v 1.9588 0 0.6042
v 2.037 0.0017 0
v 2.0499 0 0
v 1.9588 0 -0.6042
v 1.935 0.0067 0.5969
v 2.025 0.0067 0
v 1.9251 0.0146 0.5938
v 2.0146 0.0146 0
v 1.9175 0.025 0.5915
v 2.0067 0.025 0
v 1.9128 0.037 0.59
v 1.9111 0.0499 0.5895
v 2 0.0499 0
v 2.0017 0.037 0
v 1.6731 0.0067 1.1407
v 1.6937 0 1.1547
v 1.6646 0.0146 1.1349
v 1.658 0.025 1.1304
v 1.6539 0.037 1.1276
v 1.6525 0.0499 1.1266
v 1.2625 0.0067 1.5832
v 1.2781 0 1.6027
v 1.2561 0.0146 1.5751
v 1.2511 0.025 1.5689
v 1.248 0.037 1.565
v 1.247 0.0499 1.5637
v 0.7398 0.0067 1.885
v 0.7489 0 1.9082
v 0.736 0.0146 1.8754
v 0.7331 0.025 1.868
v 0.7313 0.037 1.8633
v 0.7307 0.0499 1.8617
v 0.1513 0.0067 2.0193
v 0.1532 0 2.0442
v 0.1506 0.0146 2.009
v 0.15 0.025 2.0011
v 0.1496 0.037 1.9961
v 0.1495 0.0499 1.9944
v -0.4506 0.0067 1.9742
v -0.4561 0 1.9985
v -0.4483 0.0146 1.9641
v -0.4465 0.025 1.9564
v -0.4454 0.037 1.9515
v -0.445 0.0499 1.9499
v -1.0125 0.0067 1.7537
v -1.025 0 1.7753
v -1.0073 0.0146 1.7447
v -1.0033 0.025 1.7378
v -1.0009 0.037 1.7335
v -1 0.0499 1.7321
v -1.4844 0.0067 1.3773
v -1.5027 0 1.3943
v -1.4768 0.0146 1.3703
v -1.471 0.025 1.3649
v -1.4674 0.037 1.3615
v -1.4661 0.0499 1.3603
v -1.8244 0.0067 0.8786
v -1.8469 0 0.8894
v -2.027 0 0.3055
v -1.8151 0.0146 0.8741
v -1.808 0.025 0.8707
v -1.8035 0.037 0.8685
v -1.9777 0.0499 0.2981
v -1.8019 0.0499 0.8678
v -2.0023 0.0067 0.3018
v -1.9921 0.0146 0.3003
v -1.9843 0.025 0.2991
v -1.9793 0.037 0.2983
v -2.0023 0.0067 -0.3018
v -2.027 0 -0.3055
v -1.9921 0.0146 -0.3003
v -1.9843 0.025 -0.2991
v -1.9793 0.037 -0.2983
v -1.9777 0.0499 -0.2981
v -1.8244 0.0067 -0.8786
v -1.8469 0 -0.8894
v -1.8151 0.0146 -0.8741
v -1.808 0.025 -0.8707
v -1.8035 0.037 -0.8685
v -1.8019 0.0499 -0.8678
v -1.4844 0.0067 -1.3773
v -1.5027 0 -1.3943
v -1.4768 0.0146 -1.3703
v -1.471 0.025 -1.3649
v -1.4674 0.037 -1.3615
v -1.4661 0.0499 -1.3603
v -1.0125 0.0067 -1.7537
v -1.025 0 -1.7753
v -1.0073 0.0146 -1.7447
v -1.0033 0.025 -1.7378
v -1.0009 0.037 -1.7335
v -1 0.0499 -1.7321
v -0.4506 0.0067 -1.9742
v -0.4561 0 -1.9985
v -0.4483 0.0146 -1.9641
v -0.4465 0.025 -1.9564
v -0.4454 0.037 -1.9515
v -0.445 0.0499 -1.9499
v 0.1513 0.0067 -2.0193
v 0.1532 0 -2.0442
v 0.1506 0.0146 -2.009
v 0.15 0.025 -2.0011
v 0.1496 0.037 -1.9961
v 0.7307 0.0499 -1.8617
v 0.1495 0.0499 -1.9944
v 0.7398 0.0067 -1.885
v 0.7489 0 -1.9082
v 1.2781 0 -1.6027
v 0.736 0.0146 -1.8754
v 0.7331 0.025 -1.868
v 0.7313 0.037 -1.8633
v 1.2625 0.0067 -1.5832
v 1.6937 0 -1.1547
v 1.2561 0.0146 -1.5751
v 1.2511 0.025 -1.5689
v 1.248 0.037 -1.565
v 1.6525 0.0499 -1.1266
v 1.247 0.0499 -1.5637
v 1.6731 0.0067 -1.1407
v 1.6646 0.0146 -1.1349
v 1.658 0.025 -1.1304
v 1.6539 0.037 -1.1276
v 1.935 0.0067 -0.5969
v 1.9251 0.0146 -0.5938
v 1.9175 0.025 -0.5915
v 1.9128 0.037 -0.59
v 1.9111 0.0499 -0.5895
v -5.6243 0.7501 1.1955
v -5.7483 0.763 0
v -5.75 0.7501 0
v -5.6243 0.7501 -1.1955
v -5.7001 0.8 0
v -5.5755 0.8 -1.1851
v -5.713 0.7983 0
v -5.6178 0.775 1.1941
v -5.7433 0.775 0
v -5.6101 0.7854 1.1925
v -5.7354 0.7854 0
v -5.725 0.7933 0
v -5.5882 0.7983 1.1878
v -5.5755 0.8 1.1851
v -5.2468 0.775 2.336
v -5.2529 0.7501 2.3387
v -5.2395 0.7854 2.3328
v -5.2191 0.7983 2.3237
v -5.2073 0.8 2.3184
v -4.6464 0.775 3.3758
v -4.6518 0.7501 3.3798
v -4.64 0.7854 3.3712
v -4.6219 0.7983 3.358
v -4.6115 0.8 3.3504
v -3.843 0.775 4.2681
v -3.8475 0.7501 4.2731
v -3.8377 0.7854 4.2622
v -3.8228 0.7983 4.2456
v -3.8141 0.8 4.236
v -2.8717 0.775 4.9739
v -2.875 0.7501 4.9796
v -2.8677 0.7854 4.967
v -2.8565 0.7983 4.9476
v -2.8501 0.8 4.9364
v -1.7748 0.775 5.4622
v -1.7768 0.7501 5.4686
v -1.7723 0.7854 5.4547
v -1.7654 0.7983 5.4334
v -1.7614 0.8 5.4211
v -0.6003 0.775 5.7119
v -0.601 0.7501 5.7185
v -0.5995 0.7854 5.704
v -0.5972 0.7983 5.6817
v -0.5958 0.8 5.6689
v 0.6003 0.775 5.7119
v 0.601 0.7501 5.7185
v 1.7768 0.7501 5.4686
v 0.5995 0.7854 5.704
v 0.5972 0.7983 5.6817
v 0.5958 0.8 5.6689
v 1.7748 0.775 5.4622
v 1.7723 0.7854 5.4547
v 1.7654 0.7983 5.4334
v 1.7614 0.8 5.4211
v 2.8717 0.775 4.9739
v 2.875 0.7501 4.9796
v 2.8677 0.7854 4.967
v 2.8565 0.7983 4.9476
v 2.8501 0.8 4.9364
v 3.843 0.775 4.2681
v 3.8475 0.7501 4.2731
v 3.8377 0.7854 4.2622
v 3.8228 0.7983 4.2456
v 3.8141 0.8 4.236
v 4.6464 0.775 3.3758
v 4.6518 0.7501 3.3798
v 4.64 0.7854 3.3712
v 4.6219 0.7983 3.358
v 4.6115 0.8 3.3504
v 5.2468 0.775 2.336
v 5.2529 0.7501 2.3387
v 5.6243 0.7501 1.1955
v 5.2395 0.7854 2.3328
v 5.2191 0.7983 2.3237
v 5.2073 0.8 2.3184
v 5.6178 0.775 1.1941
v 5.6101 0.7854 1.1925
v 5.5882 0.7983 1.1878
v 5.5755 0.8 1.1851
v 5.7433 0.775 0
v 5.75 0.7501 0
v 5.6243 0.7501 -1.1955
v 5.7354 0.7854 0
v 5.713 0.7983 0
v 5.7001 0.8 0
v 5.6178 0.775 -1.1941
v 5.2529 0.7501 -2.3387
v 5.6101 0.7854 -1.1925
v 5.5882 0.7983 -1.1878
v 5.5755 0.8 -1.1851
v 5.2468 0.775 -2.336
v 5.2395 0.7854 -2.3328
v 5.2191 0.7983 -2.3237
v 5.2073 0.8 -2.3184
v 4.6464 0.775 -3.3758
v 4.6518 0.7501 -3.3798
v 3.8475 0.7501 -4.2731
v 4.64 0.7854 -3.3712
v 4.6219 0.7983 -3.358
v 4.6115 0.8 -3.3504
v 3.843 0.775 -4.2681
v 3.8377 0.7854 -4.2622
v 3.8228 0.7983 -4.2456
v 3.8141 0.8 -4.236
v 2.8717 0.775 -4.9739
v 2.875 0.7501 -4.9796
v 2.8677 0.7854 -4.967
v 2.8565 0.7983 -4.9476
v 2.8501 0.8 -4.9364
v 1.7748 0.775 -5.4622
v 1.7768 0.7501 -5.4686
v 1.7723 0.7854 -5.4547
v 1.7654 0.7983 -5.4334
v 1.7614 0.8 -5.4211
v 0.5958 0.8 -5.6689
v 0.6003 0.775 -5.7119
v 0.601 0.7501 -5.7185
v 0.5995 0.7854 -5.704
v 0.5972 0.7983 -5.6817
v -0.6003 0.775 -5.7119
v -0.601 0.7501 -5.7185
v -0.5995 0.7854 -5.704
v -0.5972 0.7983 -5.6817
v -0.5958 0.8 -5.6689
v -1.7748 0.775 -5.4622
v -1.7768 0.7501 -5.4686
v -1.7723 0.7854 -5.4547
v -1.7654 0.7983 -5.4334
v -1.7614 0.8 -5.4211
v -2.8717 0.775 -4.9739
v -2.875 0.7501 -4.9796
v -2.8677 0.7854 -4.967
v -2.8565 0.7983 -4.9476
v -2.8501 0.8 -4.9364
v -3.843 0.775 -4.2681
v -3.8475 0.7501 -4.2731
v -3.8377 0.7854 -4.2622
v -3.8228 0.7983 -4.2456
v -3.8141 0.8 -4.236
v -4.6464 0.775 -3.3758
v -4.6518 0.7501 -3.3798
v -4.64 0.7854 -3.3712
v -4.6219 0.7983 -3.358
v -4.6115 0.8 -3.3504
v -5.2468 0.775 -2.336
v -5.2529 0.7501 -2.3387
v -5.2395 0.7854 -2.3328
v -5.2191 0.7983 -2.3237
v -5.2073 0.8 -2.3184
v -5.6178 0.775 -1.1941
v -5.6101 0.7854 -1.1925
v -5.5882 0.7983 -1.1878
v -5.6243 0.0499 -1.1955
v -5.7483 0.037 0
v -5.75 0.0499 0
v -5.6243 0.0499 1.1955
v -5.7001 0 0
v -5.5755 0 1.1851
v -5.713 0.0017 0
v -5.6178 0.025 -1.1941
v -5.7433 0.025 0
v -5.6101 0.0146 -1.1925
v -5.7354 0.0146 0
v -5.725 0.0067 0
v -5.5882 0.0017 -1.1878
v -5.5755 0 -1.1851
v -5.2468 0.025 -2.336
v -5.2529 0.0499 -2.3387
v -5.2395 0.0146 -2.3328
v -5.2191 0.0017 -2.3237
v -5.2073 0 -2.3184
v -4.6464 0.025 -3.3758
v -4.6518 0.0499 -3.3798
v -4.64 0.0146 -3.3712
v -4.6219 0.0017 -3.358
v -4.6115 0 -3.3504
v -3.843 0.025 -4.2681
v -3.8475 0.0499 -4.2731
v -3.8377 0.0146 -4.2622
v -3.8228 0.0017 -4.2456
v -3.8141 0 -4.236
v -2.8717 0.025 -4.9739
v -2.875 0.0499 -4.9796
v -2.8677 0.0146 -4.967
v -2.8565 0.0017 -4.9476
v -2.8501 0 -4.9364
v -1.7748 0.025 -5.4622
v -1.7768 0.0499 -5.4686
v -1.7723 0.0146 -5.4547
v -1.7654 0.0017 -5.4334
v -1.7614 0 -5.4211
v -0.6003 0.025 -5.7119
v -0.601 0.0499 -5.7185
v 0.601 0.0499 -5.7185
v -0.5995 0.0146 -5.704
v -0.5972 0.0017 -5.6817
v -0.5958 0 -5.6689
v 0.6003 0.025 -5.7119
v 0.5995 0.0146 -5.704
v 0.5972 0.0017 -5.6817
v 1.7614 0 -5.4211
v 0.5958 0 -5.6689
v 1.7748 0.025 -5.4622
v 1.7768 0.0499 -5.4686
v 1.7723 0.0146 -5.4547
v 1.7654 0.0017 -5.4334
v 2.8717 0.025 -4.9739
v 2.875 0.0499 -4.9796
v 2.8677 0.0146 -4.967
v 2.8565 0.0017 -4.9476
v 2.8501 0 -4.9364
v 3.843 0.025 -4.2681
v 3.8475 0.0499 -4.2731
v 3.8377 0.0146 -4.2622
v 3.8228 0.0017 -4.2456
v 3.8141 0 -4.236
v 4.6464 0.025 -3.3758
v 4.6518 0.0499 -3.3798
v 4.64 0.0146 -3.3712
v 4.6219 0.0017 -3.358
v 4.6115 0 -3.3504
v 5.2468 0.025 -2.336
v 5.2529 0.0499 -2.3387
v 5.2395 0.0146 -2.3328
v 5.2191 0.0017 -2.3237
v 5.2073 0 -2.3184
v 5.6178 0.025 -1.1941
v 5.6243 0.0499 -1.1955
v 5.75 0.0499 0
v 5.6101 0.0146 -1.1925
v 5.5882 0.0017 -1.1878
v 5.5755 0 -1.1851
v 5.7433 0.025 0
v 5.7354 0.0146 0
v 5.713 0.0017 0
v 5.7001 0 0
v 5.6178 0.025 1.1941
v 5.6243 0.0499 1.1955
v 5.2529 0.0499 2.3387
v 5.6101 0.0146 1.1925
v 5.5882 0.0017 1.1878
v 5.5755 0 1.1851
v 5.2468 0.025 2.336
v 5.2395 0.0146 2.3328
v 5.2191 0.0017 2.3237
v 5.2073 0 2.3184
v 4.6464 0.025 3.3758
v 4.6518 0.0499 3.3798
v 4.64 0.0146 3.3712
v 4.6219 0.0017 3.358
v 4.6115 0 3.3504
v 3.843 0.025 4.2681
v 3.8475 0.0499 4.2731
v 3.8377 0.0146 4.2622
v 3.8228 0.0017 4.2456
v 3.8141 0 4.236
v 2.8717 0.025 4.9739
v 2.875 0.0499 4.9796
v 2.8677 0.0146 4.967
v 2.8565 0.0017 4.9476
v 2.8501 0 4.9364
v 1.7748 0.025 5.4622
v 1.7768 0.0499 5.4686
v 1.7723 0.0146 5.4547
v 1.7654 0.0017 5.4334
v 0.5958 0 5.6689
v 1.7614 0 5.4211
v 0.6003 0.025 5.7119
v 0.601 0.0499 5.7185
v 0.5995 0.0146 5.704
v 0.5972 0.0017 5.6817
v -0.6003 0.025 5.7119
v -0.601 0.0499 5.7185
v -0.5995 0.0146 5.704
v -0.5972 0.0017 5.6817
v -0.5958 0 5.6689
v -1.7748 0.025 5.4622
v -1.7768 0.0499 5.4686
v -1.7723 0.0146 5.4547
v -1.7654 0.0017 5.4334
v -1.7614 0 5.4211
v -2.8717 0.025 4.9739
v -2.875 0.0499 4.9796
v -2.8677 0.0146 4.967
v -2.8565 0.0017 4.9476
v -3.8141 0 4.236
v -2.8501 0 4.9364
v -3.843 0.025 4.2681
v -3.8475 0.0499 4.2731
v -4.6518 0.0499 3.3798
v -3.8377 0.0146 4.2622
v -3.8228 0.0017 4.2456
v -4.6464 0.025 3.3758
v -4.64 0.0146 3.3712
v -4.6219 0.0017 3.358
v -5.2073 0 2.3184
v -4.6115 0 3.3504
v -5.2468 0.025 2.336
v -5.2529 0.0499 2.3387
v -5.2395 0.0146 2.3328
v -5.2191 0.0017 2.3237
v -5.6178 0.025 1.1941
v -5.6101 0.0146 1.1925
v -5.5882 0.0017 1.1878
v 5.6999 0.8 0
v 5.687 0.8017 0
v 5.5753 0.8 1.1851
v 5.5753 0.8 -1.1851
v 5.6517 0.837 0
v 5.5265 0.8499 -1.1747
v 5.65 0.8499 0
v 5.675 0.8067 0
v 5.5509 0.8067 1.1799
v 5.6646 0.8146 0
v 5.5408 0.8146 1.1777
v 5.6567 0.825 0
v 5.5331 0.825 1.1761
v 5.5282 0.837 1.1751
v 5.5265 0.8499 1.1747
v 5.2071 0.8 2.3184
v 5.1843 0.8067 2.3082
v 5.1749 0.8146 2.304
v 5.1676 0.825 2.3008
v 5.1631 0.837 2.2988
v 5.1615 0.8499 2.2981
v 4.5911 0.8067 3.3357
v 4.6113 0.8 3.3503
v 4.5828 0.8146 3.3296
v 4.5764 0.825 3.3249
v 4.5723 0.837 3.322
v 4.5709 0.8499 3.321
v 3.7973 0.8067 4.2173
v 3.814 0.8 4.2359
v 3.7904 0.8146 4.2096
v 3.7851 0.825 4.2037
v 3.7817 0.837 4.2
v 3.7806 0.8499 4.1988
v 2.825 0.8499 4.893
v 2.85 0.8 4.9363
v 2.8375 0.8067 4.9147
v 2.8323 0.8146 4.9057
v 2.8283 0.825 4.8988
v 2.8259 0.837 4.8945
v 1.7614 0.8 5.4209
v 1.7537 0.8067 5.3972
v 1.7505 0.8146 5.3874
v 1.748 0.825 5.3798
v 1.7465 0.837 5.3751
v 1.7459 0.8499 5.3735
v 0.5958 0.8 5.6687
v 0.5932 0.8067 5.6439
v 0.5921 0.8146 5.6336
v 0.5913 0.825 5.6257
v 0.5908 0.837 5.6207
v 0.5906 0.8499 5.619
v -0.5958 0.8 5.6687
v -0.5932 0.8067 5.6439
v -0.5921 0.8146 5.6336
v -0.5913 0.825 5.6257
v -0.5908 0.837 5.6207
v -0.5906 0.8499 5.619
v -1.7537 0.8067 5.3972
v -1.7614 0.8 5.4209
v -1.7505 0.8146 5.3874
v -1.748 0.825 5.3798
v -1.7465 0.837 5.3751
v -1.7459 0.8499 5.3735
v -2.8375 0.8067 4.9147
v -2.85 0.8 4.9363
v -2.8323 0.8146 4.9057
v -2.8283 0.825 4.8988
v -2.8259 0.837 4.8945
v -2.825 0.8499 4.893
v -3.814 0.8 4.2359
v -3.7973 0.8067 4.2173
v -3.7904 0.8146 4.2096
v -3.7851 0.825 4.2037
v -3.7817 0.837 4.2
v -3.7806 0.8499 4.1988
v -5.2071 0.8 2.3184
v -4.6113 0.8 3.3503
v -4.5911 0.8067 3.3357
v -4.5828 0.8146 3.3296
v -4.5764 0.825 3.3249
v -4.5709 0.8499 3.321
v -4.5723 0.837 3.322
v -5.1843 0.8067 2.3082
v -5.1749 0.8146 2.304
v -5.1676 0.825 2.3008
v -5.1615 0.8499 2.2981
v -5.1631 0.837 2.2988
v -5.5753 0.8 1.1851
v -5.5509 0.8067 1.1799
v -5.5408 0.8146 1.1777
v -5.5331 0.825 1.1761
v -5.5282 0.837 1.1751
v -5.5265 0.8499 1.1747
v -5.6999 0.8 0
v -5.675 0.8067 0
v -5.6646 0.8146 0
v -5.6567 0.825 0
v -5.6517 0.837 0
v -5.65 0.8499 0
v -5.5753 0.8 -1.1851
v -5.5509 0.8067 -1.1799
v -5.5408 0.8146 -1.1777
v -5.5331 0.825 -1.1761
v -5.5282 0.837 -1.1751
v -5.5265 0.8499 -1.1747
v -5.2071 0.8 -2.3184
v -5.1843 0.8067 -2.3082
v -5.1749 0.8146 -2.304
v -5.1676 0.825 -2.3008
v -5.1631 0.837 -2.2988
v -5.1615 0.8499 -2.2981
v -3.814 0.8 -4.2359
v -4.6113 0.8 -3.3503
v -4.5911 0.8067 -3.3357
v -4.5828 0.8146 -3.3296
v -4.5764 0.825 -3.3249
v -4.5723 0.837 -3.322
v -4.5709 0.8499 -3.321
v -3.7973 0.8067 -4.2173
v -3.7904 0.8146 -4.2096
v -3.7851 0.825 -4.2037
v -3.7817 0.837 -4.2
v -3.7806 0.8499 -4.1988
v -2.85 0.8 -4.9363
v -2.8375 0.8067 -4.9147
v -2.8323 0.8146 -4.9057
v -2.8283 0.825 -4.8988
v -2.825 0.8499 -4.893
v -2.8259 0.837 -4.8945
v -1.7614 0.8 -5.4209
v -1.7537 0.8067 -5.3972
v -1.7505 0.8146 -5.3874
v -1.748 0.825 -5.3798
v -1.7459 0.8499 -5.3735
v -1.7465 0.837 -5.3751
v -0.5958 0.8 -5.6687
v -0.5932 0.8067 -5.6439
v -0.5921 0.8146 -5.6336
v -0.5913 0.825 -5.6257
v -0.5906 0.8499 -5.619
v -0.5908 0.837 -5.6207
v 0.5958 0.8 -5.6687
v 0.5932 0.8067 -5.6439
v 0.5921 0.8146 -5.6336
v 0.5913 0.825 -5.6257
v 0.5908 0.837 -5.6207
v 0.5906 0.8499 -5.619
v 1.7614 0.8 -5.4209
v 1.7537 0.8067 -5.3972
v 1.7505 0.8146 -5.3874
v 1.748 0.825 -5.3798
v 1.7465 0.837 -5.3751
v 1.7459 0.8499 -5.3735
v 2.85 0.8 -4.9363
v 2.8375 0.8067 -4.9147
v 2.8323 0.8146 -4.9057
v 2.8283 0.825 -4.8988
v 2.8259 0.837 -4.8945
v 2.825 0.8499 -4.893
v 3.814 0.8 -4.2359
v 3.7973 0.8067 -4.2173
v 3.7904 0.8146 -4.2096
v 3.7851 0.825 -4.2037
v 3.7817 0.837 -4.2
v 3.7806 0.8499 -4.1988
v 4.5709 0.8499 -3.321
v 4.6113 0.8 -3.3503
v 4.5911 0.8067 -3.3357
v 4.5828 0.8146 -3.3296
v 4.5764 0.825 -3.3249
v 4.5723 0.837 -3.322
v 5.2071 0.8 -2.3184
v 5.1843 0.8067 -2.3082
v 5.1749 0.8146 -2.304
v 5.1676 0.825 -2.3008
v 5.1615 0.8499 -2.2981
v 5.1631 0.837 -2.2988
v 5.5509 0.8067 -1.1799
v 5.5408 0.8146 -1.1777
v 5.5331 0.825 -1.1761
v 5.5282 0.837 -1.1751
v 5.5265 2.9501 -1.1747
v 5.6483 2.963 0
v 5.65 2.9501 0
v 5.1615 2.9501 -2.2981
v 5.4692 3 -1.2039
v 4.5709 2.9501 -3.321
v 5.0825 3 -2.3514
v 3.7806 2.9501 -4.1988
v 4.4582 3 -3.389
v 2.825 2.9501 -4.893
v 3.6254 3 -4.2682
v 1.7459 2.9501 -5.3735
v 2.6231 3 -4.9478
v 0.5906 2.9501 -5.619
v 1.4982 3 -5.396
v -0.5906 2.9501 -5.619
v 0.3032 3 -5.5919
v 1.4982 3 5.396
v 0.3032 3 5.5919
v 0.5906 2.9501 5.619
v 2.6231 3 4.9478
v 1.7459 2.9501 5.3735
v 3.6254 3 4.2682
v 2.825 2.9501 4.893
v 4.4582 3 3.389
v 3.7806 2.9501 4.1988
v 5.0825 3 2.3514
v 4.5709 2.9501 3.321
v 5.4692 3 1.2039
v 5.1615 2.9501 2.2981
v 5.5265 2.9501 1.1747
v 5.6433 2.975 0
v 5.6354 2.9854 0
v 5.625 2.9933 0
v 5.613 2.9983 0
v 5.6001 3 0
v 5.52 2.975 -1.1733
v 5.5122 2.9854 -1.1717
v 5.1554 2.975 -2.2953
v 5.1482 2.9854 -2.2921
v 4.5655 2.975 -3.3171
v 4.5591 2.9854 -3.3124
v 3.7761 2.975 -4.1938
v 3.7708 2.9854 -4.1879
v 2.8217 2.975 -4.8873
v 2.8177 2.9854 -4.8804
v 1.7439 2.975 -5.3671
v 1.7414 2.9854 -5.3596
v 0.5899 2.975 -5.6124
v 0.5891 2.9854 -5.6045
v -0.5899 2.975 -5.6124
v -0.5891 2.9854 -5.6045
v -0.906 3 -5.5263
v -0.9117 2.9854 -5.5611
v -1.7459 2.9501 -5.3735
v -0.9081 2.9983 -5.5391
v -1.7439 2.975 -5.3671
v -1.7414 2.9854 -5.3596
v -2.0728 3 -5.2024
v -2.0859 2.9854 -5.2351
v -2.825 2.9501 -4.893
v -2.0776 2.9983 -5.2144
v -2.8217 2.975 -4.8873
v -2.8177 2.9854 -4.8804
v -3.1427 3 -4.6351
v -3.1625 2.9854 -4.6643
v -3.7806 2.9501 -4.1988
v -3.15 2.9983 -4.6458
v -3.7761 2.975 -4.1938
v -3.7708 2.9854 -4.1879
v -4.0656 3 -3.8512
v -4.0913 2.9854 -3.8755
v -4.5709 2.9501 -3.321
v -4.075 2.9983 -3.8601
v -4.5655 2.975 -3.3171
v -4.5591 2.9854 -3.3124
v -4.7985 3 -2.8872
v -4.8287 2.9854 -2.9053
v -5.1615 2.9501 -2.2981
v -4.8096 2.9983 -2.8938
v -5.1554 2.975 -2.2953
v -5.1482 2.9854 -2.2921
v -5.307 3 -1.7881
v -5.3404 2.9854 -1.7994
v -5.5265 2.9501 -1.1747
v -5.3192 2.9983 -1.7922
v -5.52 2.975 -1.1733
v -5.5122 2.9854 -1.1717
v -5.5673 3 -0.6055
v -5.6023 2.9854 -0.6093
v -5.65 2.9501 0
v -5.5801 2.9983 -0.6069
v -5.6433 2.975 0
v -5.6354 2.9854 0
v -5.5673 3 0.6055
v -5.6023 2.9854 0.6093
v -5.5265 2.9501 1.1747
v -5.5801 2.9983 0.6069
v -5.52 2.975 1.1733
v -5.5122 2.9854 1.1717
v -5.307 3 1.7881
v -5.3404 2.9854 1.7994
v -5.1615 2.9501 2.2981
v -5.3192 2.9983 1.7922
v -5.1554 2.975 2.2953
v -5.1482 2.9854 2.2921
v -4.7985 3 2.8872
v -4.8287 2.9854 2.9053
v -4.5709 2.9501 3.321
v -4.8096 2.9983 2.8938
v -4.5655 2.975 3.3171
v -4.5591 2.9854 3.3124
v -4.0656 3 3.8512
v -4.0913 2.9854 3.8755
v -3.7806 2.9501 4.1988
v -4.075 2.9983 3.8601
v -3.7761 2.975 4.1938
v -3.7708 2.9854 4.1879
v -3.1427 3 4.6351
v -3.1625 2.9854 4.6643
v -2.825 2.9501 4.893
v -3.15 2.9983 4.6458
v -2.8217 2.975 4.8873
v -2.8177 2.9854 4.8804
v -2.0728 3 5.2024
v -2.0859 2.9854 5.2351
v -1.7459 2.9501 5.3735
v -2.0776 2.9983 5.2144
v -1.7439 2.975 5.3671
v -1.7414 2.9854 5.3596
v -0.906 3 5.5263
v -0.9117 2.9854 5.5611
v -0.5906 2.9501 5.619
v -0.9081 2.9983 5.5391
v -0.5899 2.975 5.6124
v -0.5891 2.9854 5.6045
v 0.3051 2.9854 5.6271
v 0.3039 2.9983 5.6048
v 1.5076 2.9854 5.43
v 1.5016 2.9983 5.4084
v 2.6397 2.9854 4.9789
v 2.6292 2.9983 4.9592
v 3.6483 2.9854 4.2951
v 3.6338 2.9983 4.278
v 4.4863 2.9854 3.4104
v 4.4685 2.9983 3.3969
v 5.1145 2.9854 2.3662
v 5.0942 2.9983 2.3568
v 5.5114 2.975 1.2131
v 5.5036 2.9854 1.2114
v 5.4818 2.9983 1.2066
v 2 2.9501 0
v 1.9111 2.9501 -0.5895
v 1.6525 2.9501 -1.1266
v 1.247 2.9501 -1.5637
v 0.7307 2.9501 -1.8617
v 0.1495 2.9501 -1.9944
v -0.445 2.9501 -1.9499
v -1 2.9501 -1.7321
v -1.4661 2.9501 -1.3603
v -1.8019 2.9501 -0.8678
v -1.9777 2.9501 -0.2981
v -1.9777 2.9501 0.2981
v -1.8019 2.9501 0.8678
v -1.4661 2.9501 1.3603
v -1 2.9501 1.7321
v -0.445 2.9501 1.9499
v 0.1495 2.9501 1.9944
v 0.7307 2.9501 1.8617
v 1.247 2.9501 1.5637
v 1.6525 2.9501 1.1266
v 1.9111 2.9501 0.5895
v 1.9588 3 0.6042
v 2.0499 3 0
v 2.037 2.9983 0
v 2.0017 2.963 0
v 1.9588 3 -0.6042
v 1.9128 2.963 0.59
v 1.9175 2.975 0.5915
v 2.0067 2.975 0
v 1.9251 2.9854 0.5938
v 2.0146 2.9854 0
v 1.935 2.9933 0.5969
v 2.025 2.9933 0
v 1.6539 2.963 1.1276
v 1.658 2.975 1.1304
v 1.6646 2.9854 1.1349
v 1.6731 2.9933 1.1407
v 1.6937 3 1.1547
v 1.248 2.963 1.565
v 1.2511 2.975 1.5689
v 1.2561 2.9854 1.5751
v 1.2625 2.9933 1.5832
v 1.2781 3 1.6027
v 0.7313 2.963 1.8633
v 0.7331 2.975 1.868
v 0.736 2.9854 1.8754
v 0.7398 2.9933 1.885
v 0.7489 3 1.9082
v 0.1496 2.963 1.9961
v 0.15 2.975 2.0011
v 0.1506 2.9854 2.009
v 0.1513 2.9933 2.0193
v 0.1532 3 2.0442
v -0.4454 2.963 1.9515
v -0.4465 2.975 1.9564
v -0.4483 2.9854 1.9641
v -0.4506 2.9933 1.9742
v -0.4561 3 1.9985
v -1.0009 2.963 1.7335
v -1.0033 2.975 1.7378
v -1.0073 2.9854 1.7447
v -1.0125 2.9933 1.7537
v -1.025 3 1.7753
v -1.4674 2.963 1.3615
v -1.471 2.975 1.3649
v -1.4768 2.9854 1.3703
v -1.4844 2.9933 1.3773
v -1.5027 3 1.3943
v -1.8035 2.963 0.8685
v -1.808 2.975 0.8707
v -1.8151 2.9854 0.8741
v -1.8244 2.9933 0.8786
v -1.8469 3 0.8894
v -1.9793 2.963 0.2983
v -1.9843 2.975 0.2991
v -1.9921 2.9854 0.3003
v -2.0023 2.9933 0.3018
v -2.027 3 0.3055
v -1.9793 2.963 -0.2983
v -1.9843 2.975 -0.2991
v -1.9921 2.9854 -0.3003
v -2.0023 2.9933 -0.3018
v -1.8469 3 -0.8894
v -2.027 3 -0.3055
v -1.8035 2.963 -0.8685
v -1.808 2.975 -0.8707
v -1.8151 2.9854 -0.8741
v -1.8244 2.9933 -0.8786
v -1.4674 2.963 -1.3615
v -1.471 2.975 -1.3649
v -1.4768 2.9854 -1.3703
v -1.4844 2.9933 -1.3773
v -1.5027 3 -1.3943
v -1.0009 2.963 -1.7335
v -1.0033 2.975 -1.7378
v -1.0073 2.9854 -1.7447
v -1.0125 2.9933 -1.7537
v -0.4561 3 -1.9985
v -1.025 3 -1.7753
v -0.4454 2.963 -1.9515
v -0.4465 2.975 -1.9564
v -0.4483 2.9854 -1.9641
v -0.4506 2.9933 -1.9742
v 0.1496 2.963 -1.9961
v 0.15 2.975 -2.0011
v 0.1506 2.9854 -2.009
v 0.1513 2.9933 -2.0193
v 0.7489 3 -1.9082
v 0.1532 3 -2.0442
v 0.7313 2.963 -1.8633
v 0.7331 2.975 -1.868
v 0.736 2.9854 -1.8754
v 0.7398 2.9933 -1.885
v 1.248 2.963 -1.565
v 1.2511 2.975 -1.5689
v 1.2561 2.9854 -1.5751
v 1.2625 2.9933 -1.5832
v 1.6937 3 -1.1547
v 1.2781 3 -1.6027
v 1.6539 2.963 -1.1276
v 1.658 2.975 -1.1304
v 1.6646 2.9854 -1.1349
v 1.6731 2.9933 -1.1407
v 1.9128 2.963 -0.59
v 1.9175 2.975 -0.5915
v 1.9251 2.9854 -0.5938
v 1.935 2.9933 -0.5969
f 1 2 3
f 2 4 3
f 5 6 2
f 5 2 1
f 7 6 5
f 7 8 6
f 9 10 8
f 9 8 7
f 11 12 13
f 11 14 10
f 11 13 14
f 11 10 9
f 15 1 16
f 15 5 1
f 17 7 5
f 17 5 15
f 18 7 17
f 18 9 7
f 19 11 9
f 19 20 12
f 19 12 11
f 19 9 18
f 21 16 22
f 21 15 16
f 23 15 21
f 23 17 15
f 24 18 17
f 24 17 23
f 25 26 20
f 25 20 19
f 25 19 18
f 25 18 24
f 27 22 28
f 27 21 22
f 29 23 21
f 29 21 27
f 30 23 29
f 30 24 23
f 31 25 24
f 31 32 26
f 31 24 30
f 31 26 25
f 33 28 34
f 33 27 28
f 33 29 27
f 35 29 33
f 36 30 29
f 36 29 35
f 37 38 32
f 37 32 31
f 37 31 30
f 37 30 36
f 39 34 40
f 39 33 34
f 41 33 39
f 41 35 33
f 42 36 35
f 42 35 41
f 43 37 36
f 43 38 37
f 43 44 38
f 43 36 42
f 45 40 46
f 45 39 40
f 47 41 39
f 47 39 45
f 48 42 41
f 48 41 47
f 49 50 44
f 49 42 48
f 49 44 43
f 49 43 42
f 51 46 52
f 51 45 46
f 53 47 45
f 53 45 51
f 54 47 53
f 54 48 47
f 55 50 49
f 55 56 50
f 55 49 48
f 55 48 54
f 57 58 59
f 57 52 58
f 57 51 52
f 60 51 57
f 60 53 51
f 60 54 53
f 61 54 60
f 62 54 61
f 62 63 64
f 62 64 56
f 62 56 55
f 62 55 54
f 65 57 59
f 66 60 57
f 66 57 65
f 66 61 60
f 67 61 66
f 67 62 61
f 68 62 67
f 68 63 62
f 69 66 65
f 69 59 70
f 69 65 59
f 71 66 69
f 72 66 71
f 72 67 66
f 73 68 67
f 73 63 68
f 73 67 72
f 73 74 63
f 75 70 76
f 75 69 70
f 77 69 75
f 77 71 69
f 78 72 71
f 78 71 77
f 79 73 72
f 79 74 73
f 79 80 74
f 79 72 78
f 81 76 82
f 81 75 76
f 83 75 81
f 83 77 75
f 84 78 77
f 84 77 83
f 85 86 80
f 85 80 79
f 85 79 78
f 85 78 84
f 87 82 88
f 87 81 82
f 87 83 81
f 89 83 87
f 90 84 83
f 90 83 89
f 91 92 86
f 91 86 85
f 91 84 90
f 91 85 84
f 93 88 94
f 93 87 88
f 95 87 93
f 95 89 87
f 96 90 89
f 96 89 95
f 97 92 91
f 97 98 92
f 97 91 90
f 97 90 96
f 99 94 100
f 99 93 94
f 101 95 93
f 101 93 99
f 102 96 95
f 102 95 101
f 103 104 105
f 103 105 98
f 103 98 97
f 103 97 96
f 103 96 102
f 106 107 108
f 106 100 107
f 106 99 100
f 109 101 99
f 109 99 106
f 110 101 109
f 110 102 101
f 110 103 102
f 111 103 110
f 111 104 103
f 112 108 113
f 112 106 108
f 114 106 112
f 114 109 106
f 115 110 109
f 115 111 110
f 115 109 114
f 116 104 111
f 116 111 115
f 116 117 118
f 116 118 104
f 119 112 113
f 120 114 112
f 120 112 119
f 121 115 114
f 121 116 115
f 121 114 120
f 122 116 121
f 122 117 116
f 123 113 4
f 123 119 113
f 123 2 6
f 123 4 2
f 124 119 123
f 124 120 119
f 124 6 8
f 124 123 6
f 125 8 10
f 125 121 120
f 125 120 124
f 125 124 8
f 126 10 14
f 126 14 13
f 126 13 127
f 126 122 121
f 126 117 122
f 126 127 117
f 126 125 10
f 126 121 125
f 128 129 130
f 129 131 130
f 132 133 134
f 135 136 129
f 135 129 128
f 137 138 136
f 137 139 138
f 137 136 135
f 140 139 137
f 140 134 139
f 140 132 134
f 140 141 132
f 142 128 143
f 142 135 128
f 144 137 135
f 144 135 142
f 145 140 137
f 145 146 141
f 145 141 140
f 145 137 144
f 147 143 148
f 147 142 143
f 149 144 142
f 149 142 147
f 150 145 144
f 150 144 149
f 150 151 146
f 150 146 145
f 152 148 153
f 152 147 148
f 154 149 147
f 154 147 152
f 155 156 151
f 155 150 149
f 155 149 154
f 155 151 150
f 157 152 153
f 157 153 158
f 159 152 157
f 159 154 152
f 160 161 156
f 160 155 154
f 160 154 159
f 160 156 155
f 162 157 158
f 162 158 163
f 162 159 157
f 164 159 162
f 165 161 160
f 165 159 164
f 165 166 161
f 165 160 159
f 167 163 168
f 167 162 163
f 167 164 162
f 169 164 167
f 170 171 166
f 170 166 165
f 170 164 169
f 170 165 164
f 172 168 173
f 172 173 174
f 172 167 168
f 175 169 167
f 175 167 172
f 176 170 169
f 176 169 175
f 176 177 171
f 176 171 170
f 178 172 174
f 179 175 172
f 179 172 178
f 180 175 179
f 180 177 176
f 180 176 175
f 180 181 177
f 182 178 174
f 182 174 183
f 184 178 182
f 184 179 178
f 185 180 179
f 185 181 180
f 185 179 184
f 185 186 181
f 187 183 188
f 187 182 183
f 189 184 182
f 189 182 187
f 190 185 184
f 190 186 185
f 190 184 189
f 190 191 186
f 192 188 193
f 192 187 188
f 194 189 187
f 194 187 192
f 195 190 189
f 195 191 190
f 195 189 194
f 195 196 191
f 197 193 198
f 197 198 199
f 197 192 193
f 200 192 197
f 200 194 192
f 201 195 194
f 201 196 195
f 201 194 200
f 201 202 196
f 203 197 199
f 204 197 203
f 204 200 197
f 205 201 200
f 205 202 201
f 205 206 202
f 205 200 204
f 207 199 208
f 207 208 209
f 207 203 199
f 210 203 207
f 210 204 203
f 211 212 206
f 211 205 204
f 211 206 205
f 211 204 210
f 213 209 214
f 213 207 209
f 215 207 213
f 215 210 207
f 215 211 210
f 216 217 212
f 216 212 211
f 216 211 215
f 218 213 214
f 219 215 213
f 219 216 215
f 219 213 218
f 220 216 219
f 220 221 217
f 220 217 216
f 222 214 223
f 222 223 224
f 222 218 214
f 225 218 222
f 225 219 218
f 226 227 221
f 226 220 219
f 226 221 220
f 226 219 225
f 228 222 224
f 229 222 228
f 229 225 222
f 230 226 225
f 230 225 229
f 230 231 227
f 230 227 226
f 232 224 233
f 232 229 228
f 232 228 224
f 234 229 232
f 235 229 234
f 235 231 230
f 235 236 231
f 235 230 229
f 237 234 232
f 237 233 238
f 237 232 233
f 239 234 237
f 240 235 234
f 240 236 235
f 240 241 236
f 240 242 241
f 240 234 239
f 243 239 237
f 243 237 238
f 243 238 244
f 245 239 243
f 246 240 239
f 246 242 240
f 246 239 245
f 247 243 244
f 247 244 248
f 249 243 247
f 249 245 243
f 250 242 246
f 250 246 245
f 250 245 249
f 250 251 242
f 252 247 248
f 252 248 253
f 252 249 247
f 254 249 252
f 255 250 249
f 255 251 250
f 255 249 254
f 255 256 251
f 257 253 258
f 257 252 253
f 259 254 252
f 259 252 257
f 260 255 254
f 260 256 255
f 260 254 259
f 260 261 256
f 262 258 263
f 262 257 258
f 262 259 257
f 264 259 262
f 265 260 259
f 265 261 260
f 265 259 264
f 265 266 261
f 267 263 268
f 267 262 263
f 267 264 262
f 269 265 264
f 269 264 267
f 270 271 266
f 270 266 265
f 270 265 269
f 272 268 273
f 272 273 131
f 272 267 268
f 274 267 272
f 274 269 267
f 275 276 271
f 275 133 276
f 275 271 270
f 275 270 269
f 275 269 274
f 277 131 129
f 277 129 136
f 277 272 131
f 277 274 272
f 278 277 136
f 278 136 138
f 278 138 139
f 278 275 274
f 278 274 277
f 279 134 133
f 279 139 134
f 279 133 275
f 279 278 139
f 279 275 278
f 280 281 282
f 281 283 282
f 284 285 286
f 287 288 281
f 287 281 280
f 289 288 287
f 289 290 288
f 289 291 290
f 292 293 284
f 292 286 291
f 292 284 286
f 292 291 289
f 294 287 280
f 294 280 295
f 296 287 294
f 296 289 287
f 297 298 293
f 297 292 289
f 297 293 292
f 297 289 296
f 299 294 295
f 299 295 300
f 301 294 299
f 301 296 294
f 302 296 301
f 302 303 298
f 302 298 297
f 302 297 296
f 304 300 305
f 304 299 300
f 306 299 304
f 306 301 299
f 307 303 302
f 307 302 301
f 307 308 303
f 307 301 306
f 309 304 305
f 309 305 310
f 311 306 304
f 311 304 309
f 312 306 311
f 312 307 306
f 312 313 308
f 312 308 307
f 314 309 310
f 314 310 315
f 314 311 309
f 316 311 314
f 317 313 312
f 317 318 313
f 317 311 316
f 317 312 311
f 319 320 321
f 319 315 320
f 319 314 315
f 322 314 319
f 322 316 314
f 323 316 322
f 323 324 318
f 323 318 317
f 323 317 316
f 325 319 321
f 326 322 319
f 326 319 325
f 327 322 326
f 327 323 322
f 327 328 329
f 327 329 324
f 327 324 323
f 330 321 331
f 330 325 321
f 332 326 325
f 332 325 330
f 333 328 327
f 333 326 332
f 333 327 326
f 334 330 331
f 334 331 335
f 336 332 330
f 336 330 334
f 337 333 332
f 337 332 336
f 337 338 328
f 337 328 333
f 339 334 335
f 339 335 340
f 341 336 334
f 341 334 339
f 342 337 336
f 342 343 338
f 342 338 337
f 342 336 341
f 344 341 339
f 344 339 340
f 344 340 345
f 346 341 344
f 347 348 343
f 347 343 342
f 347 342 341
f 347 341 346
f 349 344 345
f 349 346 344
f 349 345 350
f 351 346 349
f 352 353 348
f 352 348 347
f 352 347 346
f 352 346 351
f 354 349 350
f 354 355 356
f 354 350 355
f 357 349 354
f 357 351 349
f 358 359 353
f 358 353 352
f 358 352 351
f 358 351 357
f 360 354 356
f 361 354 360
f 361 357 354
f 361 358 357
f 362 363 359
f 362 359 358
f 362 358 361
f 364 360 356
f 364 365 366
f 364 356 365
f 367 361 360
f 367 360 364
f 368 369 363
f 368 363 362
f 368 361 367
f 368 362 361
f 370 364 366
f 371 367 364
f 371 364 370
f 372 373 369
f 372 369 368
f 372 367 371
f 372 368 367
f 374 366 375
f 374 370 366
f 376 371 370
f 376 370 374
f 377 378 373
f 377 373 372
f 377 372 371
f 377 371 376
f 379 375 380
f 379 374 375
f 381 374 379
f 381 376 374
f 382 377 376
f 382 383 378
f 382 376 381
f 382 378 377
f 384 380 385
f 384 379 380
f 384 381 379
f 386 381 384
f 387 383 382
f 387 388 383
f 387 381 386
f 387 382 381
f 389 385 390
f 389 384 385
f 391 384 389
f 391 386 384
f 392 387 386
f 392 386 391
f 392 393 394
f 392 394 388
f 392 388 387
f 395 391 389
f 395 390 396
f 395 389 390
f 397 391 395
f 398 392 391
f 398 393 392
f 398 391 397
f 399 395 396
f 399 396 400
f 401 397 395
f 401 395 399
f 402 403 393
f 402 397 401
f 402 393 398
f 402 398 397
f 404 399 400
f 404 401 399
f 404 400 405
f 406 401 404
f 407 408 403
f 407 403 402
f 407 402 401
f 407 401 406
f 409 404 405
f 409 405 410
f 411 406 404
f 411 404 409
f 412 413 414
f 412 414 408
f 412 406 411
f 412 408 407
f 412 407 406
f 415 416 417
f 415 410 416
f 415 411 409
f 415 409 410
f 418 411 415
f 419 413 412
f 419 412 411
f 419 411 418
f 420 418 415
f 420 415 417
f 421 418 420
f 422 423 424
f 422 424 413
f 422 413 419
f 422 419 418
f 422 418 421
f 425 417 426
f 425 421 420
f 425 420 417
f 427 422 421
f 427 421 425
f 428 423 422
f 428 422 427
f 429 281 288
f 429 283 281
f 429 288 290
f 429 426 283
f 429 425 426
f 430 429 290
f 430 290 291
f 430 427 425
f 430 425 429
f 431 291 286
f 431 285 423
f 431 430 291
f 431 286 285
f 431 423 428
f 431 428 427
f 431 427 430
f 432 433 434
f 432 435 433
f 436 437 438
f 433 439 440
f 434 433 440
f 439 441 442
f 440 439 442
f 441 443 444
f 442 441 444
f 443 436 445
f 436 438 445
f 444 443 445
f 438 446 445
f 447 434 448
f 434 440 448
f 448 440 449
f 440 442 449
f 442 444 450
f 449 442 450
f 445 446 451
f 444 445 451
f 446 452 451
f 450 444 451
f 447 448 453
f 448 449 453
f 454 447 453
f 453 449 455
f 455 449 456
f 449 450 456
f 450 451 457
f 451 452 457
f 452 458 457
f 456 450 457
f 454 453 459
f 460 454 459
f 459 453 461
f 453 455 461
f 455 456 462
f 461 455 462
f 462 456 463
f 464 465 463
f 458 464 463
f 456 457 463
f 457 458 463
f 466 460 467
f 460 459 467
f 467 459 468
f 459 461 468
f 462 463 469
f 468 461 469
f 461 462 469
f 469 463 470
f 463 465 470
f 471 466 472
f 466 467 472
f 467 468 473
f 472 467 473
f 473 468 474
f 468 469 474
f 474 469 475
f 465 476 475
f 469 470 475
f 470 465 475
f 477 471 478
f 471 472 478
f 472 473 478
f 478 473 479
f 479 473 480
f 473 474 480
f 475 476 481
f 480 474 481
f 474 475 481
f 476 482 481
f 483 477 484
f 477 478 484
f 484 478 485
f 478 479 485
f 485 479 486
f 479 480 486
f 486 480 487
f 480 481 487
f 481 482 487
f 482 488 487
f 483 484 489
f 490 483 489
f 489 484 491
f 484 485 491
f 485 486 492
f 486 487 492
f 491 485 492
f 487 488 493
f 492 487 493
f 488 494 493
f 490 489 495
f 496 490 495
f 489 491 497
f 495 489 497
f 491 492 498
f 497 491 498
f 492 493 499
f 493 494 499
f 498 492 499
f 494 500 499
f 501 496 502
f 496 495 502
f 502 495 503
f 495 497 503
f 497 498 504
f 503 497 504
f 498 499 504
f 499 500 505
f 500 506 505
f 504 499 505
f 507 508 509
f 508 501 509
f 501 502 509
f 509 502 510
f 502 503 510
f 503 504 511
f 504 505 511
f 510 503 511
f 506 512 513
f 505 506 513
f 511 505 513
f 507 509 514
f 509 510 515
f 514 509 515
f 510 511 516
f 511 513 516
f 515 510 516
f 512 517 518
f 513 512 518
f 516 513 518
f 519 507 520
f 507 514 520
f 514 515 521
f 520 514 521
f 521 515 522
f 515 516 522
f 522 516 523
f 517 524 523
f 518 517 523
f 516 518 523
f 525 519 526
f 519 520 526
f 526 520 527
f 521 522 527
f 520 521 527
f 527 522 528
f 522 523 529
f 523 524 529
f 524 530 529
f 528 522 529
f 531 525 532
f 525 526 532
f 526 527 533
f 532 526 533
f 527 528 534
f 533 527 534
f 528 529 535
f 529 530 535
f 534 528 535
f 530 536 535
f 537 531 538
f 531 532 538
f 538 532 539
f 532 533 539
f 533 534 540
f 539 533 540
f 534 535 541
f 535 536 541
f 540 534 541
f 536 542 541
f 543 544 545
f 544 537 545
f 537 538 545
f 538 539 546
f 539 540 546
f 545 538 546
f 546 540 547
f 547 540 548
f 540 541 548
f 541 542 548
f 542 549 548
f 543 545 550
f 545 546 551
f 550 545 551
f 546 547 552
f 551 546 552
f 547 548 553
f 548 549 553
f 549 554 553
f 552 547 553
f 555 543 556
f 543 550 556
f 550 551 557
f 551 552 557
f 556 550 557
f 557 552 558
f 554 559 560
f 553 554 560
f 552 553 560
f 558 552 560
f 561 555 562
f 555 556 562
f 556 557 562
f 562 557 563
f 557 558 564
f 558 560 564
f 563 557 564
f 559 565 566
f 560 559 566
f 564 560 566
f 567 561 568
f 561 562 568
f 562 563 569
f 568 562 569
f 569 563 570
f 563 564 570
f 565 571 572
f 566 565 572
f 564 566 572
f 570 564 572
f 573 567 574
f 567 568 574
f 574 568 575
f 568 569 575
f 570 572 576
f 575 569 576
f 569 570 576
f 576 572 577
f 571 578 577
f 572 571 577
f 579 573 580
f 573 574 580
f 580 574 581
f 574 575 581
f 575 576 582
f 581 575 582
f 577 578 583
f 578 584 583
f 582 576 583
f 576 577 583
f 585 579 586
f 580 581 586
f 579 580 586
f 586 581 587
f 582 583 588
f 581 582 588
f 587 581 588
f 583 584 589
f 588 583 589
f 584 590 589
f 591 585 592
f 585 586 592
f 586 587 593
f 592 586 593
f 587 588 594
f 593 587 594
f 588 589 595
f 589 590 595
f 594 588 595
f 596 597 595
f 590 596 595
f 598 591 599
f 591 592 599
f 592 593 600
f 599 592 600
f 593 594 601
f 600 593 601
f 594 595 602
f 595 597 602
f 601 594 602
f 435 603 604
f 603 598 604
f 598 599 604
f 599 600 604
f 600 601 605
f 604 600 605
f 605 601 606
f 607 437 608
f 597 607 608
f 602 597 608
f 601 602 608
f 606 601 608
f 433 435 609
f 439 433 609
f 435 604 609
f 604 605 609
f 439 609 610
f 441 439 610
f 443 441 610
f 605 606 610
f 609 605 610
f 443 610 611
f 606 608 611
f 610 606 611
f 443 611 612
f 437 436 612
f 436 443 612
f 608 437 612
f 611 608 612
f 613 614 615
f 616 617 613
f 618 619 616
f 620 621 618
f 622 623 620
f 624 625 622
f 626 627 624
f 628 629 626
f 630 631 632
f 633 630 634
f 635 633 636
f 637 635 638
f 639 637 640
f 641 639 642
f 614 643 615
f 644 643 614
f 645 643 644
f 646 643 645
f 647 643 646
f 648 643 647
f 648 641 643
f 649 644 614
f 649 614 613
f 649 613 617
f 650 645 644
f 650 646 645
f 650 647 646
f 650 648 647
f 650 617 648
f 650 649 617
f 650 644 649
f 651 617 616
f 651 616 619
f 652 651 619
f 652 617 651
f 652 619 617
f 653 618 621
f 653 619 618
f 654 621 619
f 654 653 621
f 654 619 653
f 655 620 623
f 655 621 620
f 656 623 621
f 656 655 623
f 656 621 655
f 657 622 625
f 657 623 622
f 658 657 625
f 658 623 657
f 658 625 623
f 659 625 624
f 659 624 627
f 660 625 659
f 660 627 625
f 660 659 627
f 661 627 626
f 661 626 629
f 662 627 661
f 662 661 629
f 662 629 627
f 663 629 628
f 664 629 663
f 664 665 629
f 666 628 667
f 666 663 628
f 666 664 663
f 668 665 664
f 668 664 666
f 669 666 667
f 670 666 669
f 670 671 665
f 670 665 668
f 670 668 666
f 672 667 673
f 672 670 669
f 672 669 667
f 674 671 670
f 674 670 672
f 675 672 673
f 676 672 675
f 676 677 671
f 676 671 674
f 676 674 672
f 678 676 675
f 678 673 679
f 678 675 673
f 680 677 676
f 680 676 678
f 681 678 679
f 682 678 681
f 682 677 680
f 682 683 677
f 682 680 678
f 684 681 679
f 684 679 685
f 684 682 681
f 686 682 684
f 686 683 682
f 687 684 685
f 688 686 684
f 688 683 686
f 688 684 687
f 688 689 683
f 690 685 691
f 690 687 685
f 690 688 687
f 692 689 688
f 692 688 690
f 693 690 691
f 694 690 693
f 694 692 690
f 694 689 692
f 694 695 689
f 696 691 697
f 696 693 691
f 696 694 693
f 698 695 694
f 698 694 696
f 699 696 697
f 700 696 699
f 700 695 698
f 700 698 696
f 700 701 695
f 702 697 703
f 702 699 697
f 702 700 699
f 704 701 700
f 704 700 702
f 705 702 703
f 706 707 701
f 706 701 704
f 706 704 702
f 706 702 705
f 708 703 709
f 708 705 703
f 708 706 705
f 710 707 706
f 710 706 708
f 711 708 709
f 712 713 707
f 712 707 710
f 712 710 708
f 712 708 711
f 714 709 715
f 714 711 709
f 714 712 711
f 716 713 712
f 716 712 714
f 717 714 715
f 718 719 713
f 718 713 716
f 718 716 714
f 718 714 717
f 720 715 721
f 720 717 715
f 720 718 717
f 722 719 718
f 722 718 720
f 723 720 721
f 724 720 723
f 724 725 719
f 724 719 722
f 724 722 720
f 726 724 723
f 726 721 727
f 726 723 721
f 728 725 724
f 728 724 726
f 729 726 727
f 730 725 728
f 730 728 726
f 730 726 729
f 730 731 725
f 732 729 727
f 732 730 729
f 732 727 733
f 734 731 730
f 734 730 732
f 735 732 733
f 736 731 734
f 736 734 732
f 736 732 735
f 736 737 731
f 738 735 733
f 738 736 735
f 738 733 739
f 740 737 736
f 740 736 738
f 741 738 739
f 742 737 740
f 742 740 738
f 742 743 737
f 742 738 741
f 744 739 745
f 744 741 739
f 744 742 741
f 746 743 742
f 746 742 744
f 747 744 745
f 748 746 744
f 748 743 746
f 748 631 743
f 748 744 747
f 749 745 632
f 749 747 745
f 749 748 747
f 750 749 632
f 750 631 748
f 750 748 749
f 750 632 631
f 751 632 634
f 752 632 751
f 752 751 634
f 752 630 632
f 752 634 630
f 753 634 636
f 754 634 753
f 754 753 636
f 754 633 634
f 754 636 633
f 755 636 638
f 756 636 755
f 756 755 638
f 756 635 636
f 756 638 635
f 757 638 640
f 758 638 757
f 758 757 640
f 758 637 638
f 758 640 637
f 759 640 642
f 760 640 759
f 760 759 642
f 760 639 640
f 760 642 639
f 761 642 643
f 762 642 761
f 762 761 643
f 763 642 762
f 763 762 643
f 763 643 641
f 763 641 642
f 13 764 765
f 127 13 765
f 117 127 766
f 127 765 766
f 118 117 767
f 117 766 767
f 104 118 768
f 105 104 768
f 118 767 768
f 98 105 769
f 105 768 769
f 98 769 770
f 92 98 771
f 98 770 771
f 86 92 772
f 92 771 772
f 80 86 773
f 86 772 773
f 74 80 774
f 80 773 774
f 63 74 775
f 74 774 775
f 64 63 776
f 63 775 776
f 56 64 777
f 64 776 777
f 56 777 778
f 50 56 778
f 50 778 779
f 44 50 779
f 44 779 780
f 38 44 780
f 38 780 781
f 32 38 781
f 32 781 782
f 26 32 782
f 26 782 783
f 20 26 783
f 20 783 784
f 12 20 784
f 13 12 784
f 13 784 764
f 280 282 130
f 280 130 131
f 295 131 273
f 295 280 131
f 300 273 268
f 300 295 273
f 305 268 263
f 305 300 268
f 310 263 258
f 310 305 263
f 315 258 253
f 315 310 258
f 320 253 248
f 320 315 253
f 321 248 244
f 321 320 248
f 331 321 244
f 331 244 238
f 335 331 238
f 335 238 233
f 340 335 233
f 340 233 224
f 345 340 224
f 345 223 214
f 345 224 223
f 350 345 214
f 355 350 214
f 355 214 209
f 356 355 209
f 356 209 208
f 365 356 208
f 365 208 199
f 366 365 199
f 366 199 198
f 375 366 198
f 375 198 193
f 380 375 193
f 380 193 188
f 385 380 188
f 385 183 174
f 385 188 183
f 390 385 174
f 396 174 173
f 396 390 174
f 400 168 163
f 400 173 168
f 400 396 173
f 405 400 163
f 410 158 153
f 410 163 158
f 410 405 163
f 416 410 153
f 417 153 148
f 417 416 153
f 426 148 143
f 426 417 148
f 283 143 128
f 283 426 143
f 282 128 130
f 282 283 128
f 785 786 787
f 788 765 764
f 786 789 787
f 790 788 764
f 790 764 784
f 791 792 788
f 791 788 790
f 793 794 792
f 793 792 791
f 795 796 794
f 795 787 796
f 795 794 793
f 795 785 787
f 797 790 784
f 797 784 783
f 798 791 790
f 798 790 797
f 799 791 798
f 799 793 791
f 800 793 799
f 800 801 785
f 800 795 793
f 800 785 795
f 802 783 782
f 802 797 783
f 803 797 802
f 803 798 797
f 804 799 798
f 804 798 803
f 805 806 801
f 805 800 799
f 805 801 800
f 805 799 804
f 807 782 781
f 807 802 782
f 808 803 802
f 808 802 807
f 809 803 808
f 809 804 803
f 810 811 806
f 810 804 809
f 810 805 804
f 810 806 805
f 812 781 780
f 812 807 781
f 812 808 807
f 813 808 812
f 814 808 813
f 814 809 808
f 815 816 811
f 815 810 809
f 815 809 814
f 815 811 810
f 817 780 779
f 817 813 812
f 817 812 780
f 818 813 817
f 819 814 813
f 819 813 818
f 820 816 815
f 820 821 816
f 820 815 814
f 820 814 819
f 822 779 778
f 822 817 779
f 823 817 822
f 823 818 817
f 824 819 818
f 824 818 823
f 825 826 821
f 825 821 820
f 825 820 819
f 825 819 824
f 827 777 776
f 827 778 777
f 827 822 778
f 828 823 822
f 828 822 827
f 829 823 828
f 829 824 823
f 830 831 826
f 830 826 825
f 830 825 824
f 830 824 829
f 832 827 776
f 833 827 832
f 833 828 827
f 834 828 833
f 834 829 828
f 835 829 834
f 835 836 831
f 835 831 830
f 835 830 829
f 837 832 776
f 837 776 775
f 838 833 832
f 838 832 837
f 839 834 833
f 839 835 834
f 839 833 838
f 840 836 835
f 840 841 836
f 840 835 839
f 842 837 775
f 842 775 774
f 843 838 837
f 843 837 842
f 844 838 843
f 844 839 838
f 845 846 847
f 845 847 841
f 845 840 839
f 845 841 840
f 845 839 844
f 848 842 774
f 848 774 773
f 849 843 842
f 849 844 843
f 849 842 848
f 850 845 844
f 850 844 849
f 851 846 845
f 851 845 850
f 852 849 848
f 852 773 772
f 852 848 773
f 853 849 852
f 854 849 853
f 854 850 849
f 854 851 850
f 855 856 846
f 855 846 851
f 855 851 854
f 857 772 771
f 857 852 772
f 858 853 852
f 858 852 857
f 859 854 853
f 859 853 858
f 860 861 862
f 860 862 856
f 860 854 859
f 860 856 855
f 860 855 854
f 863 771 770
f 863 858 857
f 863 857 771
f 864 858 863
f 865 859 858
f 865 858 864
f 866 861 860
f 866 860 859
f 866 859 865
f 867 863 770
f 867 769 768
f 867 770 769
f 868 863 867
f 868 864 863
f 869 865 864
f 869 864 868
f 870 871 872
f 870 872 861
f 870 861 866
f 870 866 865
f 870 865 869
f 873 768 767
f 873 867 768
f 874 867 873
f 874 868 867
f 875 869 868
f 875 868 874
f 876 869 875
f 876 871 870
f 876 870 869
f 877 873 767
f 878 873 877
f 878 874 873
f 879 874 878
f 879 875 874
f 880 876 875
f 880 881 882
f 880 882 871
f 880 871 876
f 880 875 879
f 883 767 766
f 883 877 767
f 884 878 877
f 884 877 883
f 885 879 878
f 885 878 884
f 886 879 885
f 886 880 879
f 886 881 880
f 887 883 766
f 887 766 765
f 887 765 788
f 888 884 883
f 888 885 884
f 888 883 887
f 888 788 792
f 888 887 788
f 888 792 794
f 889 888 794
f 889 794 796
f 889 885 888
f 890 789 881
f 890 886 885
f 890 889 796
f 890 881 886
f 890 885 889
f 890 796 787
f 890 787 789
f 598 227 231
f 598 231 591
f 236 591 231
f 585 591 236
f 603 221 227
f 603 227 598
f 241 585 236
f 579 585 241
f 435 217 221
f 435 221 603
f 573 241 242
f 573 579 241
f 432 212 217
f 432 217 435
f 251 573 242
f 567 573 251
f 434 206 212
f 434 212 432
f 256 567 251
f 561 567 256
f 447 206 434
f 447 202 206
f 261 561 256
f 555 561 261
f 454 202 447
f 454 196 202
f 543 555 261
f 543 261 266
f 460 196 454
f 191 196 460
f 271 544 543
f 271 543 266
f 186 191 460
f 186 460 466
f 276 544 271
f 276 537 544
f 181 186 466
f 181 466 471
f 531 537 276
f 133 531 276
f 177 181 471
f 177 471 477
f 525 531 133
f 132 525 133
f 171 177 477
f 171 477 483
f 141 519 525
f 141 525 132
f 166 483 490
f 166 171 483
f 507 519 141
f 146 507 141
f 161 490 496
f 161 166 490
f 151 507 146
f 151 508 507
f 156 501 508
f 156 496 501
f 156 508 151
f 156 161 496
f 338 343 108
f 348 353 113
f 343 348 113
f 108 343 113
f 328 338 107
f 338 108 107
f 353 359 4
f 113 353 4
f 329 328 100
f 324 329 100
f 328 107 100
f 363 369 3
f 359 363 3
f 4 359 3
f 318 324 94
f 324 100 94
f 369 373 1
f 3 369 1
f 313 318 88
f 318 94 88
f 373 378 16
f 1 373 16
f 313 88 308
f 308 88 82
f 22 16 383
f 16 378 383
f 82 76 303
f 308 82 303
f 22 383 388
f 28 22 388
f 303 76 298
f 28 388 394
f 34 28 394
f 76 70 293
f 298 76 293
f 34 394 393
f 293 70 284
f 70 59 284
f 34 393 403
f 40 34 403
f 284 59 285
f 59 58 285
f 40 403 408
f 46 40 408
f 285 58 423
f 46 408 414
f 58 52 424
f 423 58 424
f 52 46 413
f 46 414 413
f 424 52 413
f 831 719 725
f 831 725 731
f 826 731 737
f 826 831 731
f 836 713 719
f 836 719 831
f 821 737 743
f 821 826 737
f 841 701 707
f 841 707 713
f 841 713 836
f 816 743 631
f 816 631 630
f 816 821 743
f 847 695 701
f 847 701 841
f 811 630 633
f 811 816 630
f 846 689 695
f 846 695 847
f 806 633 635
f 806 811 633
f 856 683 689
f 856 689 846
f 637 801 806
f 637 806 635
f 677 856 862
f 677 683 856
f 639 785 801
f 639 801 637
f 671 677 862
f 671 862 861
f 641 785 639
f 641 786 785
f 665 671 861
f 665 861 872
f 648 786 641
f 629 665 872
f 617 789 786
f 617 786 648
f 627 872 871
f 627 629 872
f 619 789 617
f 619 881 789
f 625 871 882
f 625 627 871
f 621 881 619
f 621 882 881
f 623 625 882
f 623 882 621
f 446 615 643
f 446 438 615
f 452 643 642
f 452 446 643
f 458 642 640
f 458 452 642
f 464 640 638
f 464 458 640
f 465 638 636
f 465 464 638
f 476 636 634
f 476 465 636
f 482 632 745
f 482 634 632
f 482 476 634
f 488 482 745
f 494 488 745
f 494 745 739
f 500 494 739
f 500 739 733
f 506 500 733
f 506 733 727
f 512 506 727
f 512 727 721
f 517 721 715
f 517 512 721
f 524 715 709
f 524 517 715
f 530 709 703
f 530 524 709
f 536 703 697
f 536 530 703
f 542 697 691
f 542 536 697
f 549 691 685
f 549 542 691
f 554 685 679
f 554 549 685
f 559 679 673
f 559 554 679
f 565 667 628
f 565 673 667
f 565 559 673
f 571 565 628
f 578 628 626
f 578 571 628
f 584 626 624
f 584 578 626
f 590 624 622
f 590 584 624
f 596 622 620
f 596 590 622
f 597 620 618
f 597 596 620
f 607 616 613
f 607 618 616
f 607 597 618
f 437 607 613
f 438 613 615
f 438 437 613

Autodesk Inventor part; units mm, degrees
ref_plane "YZ Plane" through (0, 0, 0) normal (1, 0, 0) x (0, 1, 0)
ref_plane "XZ Plane" through (0, 0, 0) normal (0, 1, 0) x (-1, 0, 0)
ref_plane "XY Plane" through (0, 0, 0) normal (0, 0, 1) x (1, 0, 0)
sketch "Sketch1" plane through (0, 0, 0) normal (0, 1, 0) x (-1, 0, 0)
  circle A0 centre (0, 0) radius 5.75
  dimension "d0" = 11.5
extrude "Extrusion1" add sketch "Sketch1" along normal blind 0.8
sketch "Sketch2" plane through (0, 0.8, 0) normal (0, 1, 0) x (1, 0, 0)
  circle A0 centre (0, 0) radius 5.65
  dimension "d3" = 11.3
extrude "Extrusion2" add sketch "Sketch2" along normal blind 2.2
sketch "Sketch3" plane through (0, 3, 0) normal (0, 1, 0) x (1, 0, 0)
  circle A0 centre (0, 0) radius 2
  dimension "d6" = 4
extrude "Extrusion3" cut sketch "Sketch3" against normal blind 3.2
fillet "Fillet1" radius 0.05 6 edges at (-5.65, 3, 0) (-5.65, 0.8, 0) (5.75, 0.8, 0) (5.75, 0, 0) (-2, 3, 0) (-2, 0, 0)
properties part number "flangedBearing_2x10x4"
